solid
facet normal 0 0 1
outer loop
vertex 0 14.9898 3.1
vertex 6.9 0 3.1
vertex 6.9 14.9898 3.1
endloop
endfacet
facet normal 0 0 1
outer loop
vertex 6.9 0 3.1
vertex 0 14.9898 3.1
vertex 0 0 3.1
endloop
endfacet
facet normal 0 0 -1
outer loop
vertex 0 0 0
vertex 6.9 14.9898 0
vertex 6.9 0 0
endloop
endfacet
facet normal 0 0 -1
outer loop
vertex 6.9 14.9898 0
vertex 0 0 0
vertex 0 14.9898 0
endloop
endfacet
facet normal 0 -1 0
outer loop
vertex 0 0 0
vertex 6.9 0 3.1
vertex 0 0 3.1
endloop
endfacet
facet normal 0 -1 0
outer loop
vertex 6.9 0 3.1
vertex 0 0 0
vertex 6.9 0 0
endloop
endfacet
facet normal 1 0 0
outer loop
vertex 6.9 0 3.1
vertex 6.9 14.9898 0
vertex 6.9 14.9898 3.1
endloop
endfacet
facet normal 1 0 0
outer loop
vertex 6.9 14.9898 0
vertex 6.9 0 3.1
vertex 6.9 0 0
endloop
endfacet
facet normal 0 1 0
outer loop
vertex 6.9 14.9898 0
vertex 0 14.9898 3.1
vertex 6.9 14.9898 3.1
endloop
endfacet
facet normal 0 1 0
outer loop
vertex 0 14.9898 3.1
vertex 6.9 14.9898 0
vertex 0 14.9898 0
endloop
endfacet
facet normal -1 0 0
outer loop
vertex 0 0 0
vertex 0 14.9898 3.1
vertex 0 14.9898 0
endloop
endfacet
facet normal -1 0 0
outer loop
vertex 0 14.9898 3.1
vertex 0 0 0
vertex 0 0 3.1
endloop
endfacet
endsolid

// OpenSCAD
use <../../../modules/leverless_pws_blaze.scad>

nut_plug(corner = true);
